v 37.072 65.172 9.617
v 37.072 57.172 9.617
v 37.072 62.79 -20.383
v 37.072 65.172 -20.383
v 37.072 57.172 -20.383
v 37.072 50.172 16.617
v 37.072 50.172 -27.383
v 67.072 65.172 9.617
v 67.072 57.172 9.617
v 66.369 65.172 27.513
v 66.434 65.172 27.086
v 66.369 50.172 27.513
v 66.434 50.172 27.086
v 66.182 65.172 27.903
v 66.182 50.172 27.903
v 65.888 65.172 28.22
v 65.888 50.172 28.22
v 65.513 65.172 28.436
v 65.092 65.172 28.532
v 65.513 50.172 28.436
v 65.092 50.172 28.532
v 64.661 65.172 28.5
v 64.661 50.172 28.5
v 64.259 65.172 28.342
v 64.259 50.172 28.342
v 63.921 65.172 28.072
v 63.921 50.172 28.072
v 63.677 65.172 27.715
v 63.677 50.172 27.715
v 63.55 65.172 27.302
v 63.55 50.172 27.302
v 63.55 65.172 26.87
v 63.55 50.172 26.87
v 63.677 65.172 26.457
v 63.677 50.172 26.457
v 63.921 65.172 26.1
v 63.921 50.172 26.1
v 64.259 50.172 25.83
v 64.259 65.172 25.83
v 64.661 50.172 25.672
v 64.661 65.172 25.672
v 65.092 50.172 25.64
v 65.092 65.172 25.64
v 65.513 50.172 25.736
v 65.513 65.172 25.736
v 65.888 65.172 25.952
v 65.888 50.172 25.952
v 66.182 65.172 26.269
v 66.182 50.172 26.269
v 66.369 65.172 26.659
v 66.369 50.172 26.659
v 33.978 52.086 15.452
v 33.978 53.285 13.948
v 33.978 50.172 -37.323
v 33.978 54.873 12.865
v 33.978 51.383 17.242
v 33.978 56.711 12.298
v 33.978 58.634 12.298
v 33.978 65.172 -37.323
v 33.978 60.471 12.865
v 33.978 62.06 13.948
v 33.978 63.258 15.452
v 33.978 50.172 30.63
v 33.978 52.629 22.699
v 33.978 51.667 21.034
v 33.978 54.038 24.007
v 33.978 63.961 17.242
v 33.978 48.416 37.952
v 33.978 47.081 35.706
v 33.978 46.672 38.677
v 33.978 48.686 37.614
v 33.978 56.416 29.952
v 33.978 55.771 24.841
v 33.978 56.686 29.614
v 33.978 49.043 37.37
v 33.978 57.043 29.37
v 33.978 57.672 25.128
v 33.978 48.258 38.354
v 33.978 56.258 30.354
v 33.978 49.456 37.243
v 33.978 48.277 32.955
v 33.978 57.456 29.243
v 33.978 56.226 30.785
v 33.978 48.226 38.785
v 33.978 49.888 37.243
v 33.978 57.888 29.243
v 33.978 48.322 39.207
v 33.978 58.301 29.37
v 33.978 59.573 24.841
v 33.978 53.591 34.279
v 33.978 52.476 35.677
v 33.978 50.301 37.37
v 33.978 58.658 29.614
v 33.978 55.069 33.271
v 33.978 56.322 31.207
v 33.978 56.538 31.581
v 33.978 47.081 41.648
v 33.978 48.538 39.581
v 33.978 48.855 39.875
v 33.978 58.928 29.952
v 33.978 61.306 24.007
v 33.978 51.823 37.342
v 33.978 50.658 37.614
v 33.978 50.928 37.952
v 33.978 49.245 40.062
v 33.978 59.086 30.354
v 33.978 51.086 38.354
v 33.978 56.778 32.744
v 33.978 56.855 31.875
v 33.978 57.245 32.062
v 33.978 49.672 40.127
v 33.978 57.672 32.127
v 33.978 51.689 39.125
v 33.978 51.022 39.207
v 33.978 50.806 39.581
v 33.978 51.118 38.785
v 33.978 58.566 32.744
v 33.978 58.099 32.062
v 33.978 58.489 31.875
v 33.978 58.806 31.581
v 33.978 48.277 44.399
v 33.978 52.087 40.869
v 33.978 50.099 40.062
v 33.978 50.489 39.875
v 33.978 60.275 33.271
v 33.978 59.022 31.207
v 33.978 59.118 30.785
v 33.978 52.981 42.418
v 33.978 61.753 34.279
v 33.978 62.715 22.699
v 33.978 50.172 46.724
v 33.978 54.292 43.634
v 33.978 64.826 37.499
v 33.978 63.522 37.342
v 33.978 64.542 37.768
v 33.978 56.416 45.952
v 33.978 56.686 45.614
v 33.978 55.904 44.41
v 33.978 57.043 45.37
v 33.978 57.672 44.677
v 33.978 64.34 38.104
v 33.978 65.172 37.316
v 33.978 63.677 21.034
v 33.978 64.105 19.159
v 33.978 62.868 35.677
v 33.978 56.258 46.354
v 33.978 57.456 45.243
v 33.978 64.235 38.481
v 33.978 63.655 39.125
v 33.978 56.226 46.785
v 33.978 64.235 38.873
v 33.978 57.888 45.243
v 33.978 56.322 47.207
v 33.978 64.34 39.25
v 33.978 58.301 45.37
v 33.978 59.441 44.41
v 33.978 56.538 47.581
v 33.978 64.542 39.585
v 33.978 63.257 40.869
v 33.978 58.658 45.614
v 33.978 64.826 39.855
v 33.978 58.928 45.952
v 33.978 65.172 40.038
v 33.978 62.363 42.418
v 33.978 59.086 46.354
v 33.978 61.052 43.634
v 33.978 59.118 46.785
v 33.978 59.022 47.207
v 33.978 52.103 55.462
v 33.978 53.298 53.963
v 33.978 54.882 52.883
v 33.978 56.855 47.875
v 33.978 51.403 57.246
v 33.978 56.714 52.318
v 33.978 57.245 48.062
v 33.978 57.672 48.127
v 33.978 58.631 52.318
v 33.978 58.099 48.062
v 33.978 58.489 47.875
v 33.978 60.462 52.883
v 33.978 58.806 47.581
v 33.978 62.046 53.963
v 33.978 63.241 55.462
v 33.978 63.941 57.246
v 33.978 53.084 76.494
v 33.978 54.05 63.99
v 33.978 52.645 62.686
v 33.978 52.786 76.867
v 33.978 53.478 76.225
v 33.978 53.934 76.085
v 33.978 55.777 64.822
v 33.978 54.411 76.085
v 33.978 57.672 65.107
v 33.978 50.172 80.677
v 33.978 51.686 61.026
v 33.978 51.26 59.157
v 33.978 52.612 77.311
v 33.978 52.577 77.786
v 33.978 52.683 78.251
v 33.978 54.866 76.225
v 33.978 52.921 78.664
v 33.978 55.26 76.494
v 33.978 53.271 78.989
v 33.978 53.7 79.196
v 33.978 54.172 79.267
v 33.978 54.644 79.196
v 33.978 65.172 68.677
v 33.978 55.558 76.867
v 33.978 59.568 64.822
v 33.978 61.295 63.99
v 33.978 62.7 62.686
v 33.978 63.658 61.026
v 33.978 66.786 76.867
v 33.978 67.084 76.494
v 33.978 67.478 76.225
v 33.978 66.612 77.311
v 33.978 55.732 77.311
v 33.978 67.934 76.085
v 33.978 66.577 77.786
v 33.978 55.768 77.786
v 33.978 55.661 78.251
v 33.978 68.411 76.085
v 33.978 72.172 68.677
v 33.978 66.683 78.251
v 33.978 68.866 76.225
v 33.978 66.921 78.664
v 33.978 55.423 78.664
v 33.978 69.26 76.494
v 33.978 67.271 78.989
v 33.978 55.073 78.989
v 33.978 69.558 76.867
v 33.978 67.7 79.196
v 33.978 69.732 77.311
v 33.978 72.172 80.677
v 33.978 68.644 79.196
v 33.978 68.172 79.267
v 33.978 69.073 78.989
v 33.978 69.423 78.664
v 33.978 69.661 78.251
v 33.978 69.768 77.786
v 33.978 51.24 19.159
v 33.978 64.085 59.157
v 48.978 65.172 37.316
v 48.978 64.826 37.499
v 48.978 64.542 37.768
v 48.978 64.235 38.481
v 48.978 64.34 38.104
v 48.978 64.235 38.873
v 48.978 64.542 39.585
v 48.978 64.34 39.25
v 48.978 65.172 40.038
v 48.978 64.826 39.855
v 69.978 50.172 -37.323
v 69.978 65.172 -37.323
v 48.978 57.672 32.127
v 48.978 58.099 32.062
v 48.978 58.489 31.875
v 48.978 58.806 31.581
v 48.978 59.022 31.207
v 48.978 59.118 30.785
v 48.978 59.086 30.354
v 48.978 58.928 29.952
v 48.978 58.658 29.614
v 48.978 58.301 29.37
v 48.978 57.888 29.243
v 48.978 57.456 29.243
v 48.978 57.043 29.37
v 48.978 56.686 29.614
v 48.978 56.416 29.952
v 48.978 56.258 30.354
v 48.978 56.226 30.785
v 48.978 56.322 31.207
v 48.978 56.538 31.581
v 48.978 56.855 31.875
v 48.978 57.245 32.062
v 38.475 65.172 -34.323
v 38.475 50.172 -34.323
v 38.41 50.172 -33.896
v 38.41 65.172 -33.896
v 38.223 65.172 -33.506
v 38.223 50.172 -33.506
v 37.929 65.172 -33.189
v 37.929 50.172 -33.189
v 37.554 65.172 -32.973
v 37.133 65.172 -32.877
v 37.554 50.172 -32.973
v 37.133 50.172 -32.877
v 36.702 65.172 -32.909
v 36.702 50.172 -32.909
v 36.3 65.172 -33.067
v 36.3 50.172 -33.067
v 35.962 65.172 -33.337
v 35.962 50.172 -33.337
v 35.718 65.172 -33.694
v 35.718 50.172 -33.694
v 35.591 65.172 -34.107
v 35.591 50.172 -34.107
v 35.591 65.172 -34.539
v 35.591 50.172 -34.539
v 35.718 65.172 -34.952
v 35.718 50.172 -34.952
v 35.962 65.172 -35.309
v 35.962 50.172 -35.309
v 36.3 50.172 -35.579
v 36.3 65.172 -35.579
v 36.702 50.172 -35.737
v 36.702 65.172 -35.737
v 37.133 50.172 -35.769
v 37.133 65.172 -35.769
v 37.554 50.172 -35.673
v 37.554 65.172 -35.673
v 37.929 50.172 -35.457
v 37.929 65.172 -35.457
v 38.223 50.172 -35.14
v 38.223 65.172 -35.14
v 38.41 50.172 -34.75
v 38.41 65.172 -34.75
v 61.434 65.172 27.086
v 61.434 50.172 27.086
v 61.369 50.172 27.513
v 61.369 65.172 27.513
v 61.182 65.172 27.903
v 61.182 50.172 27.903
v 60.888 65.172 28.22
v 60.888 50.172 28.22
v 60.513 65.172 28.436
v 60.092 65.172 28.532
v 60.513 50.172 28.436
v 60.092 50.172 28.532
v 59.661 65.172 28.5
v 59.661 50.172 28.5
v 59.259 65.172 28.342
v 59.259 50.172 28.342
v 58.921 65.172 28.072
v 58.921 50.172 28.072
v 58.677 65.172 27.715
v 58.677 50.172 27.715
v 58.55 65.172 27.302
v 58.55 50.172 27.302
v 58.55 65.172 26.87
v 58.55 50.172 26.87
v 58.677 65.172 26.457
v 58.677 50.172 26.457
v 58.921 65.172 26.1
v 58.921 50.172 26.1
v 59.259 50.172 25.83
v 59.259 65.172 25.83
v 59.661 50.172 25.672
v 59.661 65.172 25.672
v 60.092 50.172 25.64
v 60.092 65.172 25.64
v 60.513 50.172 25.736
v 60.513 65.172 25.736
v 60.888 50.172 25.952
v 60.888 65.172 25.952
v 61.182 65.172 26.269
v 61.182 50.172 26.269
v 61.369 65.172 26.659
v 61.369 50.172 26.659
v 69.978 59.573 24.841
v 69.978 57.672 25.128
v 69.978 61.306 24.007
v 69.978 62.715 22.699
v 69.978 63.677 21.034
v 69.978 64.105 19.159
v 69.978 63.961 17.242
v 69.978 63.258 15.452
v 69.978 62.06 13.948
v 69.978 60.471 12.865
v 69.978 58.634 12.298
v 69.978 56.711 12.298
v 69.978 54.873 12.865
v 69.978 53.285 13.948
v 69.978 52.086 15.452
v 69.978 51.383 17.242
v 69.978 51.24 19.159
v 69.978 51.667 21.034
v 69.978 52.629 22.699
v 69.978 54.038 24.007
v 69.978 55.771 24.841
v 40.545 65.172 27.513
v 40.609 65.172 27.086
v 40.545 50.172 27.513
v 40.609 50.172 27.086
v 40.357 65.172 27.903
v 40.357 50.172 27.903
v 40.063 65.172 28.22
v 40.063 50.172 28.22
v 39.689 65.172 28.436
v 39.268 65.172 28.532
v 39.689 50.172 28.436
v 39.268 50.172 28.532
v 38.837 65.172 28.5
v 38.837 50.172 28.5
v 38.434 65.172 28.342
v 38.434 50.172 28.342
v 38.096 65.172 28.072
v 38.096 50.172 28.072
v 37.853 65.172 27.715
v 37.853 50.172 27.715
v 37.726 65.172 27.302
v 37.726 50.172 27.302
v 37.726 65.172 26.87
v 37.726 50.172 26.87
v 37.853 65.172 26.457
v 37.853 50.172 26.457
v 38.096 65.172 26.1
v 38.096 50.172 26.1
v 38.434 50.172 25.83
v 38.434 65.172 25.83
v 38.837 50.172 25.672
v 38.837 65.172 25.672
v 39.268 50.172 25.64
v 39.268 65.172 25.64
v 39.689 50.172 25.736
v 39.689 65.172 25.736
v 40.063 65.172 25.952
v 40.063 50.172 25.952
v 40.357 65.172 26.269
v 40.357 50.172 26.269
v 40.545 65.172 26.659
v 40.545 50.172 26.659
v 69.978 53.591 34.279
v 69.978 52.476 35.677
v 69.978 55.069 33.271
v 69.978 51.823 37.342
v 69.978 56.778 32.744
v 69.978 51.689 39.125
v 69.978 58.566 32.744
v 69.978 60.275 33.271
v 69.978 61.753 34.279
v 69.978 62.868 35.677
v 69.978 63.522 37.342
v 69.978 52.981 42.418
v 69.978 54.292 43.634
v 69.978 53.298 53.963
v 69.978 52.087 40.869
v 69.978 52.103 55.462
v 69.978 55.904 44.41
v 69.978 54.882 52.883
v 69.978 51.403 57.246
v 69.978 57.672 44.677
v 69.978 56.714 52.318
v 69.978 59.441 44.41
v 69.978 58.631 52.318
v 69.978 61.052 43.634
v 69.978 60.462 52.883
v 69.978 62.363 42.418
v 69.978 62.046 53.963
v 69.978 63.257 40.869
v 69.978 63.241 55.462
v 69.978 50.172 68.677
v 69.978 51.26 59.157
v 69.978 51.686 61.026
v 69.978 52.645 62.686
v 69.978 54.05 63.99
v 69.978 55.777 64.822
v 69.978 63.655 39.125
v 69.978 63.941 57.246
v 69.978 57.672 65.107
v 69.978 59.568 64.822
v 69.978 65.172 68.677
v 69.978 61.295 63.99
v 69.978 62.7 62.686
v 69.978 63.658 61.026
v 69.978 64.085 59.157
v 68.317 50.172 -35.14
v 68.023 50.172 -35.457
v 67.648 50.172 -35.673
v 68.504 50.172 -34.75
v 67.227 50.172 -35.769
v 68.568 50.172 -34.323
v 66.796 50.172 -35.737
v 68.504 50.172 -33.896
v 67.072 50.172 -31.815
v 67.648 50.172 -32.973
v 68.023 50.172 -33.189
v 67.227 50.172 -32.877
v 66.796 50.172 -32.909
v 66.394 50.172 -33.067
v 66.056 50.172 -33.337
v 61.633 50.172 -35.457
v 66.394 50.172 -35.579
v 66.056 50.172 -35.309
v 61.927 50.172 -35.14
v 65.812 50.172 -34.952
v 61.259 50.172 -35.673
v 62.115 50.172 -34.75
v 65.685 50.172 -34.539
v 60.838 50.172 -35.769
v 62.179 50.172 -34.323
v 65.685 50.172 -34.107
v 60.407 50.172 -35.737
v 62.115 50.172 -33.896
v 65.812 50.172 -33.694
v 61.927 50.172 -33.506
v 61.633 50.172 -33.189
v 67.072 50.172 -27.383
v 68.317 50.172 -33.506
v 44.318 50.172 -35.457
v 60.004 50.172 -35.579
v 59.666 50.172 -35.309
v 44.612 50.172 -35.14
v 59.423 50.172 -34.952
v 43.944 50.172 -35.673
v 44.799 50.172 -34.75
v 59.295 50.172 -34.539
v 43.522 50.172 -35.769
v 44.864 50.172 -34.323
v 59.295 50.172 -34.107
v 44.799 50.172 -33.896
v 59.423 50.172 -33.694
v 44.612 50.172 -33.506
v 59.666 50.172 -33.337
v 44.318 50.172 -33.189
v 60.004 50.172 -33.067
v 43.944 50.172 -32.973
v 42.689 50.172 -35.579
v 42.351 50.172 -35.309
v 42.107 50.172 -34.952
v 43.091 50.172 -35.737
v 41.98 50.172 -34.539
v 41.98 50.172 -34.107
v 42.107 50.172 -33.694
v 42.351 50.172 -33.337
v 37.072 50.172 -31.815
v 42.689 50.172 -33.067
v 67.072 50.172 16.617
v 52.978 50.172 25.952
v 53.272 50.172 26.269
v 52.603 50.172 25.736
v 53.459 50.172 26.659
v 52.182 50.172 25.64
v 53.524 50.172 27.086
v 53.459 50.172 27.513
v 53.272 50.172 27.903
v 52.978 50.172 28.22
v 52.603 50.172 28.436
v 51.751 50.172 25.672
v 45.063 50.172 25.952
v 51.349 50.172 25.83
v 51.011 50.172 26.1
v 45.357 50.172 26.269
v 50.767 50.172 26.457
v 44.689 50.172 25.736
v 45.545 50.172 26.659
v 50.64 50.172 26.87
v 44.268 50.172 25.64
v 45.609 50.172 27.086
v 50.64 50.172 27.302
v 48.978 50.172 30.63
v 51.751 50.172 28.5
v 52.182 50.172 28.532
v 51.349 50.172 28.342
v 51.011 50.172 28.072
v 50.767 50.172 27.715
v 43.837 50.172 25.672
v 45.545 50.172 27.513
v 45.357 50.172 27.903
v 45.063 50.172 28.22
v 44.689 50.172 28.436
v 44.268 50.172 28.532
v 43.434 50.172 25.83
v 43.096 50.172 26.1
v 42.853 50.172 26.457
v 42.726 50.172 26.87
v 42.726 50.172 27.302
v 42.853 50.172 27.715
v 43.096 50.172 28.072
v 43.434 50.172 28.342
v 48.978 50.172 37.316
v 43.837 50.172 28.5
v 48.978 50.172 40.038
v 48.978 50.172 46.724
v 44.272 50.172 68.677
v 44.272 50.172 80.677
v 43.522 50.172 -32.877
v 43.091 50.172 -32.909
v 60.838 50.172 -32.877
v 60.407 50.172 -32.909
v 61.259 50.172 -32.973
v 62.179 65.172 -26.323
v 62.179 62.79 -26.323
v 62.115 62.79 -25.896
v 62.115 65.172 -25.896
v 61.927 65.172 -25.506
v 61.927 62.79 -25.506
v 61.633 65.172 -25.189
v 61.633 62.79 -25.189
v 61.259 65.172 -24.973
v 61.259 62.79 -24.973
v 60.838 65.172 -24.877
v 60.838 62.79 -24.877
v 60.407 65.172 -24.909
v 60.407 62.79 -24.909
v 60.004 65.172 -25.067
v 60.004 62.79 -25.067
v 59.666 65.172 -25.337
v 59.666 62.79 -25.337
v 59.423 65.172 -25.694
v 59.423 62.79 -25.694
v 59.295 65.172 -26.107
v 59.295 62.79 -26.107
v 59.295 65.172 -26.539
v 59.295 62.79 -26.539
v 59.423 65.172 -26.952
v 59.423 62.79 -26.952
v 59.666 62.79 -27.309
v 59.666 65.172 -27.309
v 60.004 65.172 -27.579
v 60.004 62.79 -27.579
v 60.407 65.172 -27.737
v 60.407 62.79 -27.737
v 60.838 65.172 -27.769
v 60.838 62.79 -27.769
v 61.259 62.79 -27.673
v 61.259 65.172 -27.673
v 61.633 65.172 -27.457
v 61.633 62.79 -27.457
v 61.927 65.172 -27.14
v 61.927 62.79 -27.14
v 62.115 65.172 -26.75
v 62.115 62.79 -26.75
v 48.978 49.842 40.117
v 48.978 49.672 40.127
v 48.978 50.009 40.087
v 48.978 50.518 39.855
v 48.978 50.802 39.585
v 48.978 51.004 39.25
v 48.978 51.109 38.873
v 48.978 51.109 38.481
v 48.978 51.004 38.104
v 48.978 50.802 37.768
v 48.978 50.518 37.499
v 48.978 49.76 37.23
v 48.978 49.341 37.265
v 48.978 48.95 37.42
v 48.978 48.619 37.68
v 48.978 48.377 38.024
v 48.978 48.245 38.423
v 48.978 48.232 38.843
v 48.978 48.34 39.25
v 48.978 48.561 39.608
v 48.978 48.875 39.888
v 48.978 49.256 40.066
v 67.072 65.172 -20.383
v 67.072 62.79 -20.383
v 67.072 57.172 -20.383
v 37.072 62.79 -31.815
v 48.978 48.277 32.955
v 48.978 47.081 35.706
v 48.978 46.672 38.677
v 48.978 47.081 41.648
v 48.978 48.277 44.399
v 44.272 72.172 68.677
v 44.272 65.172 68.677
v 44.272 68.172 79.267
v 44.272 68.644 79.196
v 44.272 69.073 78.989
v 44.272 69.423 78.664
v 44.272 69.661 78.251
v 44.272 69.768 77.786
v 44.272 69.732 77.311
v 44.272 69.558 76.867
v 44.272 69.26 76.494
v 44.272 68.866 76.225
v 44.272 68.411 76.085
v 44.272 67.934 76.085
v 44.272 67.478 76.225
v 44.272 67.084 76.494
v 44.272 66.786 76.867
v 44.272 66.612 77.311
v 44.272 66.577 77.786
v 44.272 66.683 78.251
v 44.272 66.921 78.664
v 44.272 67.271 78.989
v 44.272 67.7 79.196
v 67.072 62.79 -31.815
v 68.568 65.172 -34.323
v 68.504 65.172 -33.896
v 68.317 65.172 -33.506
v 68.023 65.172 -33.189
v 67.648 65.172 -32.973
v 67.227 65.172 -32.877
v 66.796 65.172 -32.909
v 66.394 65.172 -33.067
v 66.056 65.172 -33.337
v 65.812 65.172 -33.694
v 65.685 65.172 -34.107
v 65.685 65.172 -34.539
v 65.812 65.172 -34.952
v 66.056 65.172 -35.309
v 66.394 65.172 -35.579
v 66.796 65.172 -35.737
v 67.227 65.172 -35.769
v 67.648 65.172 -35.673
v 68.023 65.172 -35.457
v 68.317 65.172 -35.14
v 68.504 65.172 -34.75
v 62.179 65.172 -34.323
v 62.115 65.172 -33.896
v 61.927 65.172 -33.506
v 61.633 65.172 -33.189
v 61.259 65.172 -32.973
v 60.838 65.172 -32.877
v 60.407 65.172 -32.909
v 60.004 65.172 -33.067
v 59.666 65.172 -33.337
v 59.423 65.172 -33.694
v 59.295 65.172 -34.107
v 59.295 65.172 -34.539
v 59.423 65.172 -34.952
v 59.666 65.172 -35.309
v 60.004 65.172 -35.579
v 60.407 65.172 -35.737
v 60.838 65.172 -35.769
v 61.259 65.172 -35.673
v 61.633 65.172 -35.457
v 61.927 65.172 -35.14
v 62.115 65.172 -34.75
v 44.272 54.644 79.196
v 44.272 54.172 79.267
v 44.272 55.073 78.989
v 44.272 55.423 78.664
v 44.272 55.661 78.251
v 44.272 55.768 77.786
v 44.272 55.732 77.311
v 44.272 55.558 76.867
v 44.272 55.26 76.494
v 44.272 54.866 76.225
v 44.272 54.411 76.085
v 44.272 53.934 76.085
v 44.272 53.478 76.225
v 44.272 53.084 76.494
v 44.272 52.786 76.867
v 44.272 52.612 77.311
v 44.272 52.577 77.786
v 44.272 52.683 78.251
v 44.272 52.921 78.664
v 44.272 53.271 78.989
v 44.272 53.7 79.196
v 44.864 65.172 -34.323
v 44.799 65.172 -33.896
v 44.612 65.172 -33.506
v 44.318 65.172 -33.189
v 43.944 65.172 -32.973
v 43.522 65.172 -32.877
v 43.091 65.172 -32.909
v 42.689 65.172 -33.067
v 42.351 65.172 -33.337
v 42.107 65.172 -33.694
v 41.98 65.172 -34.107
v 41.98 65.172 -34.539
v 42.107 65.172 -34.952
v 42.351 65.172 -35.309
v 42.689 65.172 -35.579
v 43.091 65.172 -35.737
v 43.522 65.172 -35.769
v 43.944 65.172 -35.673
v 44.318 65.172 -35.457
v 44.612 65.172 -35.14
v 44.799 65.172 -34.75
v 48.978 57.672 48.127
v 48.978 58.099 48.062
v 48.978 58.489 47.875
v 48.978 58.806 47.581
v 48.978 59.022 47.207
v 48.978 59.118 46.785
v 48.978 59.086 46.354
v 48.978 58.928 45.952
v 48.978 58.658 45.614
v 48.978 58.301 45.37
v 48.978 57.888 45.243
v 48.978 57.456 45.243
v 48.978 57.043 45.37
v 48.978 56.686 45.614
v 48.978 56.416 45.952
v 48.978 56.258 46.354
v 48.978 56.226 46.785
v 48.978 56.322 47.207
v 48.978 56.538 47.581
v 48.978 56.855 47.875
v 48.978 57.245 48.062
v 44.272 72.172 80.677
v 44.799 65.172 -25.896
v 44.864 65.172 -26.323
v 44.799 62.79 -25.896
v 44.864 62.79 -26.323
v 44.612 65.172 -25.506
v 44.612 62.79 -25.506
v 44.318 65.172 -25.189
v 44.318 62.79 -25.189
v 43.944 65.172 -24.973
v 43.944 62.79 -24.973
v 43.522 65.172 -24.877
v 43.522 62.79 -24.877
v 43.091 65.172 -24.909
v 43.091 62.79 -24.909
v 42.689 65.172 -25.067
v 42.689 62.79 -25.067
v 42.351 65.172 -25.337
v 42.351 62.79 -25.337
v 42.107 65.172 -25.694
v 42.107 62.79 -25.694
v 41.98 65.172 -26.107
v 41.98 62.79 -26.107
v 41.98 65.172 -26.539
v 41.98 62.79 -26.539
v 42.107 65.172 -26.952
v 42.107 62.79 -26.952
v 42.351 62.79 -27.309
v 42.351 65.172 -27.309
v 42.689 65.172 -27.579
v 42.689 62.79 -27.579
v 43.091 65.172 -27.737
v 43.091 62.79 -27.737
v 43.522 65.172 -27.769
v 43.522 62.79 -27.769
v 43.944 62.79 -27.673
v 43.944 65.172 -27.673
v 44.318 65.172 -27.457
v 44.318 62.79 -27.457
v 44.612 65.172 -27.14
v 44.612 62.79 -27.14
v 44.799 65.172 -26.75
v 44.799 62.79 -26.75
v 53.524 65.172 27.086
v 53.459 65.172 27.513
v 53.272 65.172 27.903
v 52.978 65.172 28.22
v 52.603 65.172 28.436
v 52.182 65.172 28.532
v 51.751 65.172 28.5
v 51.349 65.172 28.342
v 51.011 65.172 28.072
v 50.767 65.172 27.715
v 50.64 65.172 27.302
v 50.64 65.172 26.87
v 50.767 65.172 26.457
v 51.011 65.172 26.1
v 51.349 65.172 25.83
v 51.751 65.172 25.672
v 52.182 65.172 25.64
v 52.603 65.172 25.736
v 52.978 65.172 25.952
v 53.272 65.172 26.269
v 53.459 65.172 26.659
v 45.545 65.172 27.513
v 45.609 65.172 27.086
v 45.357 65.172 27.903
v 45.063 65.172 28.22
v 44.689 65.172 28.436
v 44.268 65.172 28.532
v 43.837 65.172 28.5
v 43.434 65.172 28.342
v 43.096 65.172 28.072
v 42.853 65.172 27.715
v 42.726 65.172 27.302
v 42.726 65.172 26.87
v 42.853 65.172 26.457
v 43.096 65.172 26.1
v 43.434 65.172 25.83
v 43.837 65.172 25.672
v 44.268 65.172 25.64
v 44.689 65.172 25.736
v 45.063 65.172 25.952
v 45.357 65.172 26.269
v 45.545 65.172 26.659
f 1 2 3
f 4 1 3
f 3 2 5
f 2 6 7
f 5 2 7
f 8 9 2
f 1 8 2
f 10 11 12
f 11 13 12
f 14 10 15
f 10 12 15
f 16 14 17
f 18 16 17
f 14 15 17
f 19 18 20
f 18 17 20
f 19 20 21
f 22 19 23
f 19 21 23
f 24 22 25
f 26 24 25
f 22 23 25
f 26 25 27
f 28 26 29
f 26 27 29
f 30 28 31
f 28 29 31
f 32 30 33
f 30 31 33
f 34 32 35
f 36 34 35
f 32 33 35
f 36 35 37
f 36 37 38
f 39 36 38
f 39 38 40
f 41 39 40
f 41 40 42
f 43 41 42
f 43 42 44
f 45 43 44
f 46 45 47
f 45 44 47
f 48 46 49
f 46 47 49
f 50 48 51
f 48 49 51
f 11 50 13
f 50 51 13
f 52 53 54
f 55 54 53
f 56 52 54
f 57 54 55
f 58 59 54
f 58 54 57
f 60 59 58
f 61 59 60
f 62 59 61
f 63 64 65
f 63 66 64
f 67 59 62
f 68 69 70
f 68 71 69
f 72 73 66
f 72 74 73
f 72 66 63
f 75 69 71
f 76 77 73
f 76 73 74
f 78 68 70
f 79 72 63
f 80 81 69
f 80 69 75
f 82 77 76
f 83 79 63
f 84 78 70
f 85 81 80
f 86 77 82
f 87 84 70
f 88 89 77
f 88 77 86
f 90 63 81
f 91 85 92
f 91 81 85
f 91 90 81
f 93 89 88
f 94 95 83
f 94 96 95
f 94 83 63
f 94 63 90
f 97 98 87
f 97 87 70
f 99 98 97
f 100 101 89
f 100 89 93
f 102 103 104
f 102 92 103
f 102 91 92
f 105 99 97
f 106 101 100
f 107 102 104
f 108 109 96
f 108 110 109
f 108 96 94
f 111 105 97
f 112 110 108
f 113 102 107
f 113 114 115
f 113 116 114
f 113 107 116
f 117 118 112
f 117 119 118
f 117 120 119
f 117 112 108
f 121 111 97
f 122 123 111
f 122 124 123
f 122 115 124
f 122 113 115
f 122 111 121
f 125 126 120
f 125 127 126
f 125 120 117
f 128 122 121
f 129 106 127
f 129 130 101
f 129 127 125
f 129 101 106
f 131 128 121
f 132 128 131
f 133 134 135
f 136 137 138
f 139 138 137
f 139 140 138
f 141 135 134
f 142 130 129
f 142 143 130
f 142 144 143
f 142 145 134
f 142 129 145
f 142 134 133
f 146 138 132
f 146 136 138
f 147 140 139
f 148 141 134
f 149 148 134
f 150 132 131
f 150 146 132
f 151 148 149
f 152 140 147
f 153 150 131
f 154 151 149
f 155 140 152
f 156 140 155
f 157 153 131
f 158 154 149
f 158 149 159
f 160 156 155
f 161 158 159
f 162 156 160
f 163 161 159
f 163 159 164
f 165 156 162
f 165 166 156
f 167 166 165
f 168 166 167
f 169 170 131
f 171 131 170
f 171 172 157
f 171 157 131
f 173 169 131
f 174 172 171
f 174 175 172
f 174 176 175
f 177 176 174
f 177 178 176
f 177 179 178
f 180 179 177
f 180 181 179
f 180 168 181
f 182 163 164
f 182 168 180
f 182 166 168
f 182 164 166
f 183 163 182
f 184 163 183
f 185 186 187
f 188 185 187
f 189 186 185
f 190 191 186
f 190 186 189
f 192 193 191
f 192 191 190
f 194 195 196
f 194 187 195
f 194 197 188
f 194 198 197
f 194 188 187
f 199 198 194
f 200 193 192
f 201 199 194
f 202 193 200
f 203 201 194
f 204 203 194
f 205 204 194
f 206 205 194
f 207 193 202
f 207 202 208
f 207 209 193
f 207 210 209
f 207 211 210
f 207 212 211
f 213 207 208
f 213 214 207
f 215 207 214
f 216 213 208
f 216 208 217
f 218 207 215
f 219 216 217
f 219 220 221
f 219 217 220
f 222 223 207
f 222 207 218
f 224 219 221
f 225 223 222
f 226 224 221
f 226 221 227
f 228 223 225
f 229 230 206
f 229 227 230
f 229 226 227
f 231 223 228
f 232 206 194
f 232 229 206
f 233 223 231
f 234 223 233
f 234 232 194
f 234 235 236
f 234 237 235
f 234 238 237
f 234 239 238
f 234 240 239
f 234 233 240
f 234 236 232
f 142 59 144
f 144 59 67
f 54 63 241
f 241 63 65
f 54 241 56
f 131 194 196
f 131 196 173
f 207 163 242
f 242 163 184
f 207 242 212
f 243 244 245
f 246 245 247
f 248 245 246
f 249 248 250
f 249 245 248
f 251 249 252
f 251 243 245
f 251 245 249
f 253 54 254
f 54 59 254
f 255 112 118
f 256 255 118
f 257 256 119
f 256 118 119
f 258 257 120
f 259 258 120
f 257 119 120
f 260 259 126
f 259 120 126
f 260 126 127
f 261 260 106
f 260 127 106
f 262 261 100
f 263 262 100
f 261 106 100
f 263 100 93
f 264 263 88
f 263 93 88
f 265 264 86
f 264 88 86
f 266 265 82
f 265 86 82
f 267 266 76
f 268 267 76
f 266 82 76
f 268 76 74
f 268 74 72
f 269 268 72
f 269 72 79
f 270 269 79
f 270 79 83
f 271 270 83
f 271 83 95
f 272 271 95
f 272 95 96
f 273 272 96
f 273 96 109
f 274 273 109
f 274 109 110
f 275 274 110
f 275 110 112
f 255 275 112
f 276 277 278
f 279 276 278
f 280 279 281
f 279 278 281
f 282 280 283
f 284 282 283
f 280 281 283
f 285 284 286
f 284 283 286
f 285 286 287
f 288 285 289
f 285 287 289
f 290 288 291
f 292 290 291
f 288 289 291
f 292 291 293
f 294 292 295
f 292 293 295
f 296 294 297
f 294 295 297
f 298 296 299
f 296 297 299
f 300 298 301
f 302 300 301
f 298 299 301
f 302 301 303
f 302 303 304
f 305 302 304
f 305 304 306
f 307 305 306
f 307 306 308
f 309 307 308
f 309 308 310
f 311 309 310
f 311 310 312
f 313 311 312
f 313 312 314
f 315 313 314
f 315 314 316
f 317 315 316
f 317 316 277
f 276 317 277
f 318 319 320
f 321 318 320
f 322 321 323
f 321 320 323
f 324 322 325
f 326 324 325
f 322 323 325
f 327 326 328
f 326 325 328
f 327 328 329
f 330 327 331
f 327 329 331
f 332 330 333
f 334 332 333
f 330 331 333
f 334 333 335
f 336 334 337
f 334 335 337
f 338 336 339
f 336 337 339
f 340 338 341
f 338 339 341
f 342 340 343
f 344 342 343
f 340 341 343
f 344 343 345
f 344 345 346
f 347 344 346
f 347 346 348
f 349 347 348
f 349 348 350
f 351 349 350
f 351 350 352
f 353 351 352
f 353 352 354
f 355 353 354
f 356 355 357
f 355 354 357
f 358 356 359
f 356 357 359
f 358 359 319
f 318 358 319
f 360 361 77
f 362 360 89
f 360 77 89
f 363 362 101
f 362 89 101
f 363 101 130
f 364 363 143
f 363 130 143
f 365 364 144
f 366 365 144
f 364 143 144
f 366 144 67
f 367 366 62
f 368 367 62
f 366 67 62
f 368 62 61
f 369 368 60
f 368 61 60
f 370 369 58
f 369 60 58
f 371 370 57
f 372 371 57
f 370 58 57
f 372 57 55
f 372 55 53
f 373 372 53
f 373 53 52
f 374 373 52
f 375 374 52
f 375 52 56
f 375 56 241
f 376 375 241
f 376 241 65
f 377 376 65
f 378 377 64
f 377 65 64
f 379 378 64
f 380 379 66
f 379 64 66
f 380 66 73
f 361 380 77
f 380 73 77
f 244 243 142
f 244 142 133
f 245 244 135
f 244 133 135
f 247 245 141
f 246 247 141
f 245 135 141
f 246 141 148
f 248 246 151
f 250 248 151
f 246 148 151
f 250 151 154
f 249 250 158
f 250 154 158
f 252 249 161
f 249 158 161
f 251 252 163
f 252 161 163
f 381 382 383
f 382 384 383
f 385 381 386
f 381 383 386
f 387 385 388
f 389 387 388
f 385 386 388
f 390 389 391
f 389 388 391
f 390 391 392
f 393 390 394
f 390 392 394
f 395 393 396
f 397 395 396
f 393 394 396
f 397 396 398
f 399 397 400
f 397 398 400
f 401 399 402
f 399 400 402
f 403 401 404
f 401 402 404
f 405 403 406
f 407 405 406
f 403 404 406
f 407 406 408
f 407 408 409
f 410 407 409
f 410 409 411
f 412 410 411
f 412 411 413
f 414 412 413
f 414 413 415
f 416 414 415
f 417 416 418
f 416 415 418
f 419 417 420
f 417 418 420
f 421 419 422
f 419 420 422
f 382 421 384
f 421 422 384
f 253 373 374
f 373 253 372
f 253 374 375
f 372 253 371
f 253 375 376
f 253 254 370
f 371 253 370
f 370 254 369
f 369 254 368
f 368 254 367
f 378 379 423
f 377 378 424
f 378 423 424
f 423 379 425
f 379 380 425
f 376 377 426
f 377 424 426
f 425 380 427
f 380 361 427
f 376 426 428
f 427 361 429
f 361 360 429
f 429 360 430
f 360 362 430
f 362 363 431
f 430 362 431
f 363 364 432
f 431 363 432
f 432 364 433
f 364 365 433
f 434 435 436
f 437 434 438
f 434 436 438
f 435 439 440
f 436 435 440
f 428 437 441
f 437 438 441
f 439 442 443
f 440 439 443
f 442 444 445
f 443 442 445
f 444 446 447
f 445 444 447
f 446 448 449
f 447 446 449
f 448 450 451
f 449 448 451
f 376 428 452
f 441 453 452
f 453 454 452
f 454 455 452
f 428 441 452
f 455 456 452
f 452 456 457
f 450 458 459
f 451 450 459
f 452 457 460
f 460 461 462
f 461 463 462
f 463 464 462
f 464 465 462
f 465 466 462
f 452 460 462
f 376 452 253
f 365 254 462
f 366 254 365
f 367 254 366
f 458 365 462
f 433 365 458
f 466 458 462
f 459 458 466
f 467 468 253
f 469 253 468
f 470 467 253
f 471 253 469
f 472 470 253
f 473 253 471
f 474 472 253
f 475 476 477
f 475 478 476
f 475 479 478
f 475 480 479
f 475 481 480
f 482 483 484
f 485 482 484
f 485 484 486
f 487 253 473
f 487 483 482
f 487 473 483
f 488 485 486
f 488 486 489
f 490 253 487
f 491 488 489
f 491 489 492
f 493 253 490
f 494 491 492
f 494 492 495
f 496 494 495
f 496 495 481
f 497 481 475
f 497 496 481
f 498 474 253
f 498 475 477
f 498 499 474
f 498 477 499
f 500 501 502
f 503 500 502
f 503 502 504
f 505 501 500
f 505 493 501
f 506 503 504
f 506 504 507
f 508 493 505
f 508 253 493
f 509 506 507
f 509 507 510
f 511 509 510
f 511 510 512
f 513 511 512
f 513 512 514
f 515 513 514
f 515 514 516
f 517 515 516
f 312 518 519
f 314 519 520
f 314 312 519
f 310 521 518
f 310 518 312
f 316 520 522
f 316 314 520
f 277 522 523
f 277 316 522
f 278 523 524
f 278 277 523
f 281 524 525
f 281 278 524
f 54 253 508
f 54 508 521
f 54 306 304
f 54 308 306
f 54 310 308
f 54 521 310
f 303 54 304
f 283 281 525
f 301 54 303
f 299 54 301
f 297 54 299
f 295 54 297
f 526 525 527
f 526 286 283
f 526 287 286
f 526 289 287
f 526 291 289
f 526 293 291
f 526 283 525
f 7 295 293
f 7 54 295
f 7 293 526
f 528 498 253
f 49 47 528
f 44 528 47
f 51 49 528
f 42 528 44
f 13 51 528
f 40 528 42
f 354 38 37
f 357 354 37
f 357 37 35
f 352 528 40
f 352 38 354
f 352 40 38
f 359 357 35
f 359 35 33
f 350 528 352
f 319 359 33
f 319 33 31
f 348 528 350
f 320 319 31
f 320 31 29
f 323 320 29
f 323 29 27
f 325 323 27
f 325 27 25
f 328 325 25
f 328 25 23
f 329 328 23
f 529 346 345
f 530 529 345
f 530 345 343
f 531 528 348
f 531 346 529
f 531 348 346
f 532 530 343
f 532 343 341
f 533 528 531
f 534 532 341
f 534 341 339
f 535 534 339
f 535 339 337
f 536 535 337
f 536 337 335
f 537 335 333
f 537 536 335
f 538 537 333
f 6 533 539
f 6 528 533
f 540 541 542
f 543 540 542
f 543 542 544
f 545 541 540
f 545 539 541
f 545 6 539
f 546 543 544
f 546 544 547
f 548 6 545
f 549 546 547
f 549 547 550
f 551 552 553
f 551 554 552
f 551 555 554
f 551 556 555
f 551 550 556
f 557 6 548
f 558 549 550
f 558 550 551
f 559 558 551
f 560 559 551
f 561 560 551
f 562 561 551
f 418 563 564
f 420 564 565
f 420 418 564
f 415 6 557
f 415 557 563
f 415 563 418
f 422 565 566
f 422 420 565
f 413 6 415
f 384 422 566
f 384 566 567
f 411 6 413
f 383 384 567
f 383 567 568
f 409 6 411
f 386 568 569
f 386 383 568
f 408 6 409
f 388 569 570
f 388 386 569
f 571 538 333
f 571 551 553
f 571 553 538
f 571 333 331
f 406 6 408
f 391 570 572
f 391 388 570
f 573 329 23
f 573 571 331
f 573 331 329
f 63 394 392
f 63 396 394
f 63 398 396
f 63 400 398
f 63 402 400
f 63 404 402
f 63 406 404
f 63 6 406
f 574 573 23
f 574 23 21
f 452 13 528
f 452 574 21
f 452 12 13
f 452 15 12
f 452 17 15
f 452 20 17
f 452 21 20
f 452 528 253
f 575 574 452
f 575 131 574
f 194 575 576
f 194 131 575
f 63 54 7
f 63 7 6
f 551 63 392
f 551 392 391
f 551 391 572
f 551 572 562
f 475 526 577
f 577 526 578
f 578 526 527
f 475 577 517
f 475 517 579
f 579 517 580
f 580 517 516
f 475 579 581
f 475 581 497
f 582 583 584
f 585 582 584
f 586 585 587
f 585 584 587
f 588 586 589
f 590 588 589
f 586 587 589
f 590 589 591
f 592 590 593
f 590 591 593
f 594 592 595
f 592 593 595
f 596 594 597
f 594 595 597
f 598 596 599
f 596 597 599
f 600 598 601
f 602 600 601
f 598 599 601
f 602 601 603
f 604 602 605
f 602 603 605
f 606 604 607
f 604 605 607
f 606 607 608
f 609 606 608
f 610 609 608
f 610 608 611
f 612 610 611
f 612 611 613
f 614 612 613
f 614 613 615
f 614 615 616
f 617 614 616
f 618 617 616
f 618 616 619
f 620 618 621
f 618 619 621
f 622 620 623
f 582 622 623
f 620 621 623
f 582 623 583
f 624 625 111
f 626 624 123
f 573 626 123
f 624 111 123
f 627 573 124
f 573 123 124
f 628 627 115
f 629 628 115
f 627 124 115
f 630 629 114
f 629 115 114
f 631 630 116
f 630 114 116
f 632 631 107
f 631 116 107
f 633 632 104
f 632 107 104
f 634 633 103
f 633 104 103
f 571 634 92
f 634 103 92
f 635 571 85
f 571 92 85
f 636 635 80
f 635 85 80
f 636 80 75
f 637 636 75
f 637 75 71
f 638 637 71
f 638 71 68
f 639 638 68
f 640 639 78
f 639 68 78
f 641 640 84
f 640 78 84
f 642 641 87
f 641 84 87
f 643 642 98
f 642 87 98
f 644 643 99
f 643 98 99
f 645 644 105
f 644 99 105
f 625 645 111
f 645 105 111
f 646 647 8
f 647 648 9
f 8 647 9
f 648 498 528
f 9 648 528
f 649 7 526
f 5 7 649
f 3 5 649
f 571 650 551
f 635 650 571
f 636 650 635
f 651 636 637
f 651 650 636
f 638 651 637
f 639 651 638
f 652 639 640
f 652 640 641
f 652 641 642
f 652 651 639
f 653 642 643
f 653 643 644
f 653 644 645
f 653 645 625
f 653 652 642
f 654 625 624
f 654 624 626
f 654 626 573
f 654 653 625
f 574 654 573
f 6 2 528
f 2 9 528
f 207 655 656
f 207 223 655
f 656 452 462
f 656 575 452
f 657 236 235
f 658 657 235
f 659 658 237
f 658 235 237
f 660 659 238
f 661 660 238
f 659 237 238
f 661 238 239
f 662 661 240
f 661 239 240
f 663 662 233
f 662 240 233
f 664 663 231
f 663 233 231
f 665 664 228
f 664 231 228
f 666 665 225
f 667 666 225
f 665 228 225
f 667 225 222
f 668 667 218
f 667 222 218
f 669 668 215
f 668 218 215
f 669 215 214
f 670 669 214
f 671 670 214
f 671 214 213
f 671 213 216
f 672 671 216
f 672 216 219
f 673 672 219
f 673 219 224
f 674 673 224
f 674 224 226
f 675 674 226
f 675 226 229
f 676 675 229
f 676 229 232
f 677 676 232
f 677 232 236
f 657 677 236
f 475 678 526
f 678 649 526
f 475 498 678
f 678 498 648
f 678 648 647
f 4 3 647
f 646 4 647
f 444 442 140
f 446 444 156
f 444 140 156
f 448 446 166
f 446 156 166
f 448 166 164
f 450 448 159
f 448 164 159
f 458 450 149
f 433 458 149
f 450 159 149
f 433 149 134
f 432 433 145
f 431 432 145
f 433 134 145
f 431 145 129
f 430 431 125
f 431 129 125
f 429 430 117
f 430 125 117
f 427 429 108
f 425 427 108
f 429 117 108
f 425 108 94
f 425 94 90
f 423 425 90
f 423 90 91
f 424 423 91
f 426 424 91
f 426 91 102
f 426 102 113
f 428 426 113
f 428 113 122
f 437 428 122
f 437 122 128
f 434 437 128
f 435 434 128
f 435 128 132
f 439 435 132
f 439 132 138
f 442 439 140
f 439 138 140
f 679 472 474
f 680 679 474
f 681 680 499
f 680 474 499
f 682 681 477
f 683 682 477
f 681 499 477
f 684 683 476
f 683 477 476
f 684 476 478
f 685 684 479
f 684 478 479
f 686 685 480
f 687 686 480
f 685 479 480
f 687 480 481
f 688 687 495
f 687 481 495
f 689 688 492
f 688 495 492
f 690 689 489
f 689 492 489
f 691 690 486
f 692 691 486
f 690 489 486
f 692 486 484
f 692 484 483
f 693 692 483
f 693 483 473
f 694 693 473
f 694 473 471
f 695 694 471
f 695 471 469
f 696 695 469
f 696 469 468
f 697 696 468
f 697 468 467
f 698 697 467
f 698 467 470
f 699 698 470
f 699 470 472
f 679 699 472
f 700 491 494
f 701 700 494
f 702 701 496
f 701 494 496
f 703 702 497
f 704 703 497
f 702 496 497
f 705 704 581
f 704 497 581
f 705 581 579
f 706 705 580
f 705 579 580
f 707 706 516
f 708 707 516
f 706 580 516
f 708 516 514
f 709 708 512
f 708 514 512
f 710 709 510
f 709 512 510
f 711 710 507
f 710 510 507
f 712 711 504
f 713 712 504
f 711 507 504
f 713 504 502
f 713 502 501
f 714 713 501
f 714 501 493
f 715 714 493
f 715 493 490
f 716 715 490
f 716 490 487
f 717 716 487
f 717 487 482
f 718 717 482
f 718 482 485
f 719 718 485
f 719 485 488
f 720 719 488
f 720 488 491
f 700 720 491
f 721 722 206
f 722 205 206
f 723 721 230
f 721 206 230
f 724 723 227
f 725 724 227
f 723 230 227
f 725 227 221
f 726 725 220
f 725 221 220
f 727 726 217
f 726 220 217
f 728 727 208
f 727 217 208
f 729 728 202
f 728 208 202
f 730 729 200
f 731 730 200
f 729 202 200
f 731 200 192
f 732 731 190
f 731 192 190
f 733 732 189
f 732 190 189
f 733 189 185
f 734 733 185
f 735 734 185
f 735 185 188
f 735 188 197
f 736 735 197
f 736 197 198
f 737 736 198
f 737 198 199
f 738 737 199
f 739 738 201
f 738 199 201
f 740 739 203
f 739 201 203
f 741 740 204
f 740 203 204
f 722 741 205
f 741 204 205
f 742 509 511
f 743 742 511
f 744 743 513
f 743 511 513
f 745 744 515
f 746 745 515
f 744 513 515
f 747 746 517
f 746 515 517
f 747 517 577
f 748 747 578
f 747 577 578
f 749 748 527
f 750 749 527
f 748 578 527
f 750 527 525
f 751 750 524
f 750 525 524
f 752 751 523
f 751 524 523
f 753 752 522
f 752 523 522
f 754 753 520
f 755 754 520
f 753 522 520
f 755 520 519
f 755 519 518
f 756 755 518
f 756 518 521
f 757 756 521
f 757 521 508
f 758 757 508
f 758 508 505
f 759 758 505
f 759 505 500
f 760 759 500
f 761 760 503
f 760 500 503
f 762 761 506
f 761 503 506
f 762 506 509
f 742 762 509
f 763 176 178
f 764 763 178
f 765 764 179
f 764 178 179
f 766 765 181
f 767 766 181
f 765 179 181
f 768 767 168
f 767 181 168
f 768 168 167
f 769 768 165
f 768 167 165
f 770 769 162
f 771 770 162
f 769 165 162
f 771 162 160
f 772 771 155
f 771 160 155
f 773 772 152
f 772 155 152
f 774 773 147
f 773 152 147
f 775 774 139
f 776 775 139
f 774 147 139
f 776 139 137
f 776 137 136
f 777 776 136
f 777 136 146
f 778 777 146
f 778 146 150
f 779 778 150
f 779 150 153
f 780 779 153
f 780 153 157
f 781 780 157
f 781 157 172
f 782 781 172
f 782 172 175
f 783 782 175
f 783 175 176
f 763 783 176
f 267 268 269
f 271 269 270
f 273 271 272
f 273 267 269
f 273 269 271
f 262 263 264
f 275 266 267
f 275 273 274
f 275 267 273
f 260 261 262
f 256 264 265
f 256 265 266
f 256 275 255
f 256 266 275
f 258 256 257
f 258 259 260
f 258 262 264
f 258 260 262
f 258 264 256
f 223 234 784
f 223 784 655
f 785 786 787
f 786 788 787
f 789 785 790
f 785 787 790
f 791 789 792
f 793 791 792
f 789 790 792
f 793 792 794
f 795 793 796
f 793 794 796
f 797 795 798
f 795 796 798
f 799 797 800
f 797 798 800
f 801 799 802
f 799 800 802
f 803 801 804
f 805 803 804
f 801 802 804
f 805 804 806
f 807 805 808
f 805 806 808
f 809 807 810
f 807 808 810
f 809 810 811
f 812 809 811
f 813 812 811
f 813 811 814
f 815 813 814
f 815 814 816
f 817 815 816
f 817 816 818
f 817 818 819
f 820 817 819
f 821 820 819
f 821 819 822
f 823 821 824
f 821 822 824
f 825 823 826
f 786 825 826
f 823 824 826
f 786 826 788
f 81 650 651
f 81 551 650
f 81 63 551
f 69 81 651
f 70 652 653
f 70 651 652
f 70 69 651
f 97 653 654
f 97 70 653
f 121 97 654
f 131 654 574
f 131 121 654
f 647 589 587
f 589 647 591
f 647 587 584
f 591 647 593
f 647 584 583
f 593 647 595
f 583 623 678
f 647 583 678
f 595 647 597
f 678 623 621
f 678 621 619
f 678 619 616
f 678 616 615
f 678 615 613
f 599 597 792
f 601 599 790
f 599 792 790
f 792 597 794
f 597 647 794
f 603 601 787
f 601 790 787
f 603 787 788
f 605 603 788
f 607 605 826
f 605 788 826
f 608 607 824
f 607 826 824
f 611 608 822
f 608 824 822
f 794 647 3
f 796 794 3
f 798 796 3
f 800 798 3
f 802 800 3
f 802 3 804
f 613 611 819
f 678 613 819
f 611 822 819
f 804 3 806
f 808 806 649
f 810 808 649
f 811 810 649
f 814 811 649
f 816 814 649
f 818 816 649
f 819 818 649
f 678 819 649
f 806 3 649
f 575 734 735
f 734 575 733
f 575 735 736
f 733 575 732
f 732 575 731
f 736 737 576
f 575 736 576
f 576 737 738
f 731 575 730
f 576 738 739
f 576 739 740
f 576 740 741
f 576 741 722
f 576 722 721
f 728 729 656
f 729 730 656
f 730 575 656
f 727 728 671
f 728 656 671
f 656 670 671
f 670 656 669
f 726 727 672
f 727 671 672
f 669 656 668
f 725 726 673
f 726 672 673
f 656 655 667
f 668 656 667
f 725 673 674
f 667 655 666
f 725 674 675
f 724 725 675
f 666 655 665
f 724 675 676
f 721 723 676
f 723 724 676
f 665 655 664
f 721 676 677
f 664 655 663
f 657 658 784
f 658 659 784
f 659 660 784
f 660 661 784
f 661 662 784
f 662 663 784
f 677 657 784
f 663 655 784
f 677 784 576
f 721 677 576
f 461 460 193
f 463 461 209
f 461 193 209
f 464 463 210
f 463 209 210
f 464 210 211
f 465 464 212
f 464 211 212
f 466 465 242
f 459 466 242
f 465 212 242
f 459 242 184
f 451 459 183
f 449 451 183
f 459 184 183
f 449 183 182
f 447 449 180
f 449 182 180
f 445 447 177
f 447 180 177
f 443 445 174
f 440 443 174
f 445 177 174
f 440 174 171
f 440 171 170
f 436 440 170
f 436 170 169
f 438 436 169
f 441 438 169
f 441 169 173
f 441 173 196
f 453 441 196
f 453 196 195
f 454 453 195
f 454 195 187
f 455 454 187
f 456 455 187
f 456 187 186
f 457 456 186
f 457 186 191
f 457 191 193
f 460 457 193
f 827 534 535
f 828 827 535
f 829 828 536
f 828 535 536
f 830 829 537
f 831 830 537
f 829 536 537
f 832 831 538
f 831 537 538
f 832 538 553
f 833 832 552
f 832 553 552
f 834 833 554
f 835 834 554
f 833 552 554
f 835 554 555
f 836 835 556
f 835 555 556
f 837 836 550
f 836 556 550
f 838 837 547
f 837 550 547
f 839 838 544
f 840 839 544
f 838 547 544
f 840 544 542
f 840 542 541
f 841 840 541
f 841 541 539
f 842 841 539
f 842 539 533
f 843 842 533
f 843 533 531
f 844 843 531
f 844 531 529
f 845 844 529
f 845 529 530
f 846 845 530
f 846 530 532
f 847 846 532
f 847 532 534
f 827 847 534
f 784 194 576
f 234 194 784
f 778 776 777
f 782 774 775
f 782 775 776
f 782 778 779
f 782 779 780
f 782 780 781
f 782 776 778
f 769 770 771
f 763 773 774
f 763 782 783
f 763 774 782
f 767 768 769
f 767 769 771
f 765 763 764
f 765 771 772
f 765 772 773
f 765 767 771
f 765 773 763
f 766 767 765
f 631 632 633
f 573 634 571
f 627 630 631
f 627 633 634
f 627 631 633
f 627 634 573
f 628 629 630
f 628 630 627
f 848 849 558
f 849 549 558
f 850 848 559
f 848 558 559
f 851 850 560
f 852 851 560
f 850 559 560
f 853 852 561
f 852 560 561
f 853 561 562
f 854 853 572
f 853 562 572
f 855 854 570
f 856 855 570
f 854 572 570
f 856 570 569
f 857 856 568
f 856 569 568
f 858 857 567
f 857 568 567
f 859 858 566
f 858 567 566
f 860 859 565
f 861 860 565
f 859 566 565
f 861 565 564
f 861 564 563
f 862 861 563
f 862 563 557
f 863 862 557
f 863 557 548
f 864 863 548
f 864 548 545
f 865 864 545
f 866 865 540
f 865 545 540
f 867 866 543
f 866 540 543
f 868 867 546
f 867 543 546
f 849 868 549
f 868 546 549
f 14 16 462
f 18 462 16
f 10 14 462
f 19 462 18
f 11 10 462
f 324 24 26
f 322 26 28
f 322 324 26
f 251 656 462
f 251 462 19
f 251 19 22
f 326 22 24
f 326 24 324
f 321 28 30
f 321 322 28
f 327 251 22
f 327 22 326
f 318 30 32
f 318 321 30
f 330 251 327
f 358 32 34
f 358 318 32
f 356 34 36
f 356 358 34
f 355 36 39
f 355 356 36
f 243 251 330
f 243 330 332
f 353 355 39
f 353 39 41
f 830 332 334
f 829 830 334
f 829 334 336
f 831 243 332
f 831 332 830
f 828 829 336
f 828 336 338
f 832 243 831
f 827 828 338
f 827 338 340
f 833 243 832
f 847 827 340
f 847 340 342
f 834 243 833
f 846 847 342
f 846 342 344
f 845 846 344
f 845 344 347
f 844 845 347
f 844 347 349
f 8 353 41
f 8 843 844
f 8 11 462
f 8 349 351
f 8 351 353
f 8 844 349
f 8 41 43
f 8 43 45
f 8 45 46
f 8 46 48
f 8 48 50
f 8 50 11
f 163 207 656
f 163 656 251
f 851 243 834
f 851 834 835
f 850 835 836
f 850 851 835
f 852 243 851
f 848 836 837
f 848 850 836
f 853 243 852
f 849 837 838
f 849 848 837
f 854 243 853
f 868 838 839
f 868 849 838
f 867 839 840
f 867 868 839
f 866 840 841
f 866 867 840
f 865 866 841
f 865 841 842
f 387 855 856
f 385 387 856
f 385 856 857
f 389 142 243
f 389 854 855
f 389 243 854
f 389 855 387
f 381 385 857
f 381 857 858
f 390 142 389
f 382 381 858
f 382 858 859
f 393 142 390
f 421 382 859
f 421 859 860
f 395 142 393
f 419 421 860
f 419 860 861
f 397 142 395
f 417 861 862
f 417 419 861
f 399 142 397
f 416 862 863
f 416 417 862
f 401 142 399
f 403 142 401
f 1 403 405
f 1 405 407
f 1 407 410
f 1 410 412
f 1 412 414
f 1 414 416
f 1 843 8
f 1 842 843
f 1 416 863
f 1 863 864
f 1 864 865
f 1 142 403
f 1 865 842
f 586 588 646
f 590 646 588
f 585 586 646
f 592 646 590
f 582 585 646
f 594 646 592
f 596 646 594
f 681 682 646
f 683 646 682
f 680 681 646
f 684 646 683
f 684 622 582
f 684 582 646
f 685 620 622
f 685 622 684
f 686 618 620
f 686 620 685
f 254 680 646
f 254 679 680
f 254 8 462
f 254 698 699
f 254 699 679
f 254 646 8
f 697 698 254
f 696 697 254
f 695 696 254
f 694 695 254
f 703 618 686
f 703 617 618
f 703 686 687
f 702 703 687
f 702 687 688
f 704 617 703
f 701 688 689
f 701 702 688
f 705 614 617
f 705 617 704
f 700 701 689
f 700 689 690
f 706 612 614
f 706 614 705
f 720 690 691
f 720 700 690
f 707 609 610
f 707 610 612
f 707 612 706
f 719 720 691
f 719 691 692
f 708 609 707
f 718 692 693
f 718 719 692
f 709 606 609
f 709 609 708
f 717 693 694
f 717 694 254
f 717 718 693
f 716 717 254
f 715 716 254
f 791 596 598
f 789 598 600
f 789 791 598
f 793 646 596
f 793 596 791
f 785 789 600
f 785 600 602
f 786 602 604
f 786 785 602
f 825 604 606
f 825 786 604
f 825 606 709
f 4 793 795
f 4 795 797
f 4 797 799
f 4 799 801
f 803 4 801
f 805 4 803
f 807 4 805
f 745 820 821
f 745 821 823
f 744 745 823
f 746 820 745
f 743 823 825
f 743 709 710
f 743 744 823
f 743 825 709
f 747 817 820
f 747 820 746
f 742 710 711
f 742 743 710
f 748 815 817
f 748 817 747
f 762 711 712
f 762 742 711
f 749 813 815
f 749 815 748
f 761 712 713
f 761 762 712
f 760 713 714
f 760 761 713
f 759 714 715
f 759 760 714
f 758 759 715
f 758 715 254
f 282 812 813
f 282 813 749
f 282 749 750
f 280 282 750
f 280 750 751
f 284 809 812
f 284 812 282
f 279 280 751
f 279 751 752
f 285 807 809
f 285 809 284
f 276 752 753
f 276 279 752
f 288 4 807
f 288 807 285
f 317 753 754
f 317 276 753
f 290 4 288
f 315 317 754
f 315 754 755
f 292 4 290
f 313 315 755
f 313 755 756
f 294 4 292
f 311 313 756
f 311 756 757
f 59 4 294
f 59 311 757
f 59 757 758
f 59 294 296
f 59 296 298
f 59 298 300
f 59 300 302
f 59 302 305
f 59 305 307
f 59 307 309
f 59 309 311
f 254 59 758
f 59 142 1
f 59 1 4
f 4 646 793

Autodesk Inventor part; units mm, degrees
ref_plane "YZ Plane" through (0, 0, 0) normal (1, 0, 0) x (0, 1, 0)
ref_plane "Work Plane1" through (49.1675, 65.1721, -19.9847) normal (0, 1, 0) x (-1, 0, 0)
sketch "Sketch1" plane through (49.1675, 65.1721, -19.9847) normal (0, 1, 0) x (-1, 0, 0)
  circle A0 centre (-2.8102, 4.1616) radius 0.75 construction
  circle A1 centre (-2.8102, 25.1616) radius 0.75 construction
  line L0 (11.6898, 12.5705) -> (11.6898, 16.7526) construction
  arc A2 (11.6898, 16.7526) -> (11.6898, 12.5705) centre (-2.8102, 14.6616) ccw construction
  arc A3 (6.4943, 19.8433) -> (3.1979, 23.455) centre (-2.8102, 14.6616) ccw construction
  arc A4 (3.1979, 5.8681) -> (6.3691, 9.2612) centre (-2.8102, 14.6616) ccw construction
  line L1 (6.4943, 19.8433) -> (10.0762, 19.8433) construction
  line L2 (10.0762, 19.8433) -> (10.0762, 9.2612) construction
  line L3 (10.0762, 9.2612) -> (6.3691, 9.2612) construction
  arc A5 (-8.8183, 23.455) -> (-8.8183, 5.8681) centre (-2.8102, 14.6616) ccw construction
  line L4 (15.1898, -17.3384) -> (-20.8102, -17.3384)
  line L5 (-20.8102, -17.3384) -> (-20.8102, 14.6616)
  line L6 (-20.8102, 14.6616) -> (15.1898, 14.6616)
  line L7 (15.1898, 14.6616) -> (15.1898, -17.3384)
  arc A6 (4.8861, 27.3616) -> (3.5031, 1.2204) centre (-2.8102, 14.6616) ccw construction
  line L8 (4.8861, 27.3616) -> (11.8898, 27.3616) construction
  line L9 (11.8898, 27.3616) -> (11.8898, 1.9616) construction
  line L10 (11.8898, 1.9616) -> (4.7096, 1.9616) construction
  line L11 (4.7096, 1.9616) -> (2.6908, 5.7766) construction
  arc A7 (2.6908, 5.7766) -> (6.254, 9.4612) centre (-2.8102, 14.6616) ccw construction
  line L12 (6.254, 9.4612) -> (9.8762, 9.4612) construction
  line L13 (9.8762, 9.4612) -> (9.8762, 19.6433) construction
  line L14 (9.8762, 19.6433) -> (6.376, 19.6433) construction
  arc A8 (6.376, 19.6433) -> (3.2687, 23.1616) centre (-2.8102, 14.6616) ccw construction
  line L15 (3.2687, 23.1616) -> (-8.889, 23.1616) construction
  arc A9 (-8.889, 23.1616) -> (-8.446, 5.8616) centre (-2.8102, 14.6616) ccw construction
  line L16 (-8.446, 5.8616) -> (1.0472, 5.8616) construction
  line L17 (1.0472, 5.8616) -> (3.5031, 1.2204) construction
  arc A10 (-17.6602, 14.6616) -> (4.7096, 1.9616) centre (-2.9041, 14.6019) ccw
  line L18 (4.7096, 1.9616) -> (11.8943, 1.9616)
  line L19 (11.8943, 1.9616) -> (11.8898, 14.6616)
  line L20 (11.8898, 14.6616) -> (15.1898, 14.6616)
  line L21 (3.1979, 5.8681) -> (-8.8183, 5.8681) projected
  line L22 (3.1979, 23.455) -> (-8.8183, 23.455) projected
  point P0 (49.1675, 19.9847)
  dimension "d0" = 32
  dimension "d2" = 18
  dimension "d3" = 18
  dimension "d4" = 0.2
extrude "Extrusion1" add sketch "Sketch1" against normal blind 15 contours L4 L5 L6 A10 L18 L19 L7
mirror "Mirror1" about plane through (37.2777, 65.1721, -5.3231) normal (0, 0, 1) of "Extrusion1"
sketch "Sketch4" plane through (33.9777, 50.1721, -37.3231) normal (-1, 0, 0) x (0, 0, 1)
  line L0 (0, 15) -> (64, 15) projected
  line L1 (0, 15) -> (0, 0) projected
  line L2 (0, 0) -> (64, 0) projected
  line L3 (64, 15) -> (64, 0) projected
  line L4 (0, 15) -> (64, 15) projected
  line L5 (64, 15) -> (88, 15)
  line L6 (88, 15) -> (88, 0)
  line L7 (88, 0) -> (64, 0)
  line L8 (64, 0) -> (64, 15)
  circle A0 centre (56, 7.5) radius 3 projected
  circle A1 centre (56, 7.5) radius 5 projected
  circle A2 centre (76, 7.5) radius 6
  point P0 (37.3231, -50.1721)
  dimension "d20" = 24
  dimension "d21" = 12
  dimension "d24" = 12
extrude "Extrusion4" add sketch "Sketch4" against normal up to surface (36 mm away) contours L5 L6 L7 L3
ref_plane "Work Plane4" through (33.9777, 57.6721, 36.6769) normal (1, 0, 0) x (0, 0, 1)
sketch "Sketch6" plane through (33.9777, 57.6721, 36.6769) normal (1, 0, 0) x (0, 0, 1)
  circle A0 centre (10, 0) radius 1.625 construction
  circle A1 centre (2, -8) radius 1.625 projected
  circle A2 centre (-6, 0) radius 1.625 construction
  circle A3 centre (2, 8) radius 1.625 projected
  circle A4 centre (2, 0) radius 4 projected
  circle A5 centre (2, 0) radius 11 construction
  line L0 (14, 7.5) -> (-74, 7.5) projected
  arc A6 (10.0467, 7.5) -> (-6.0467, 7.5) centre (2, 0) ccw
  point P0 (-36.6769, 57.6721)
extrude "Extrusion6" add sketch "Sketch6" along normal blind 15 contours A3 L0 | A3 L0 A6 | L0 A3
sketch "Sketch5" plane through (33.9777, 50.1721, -37.3231) normal (-1, 0, 0) x (0, 0, 1)
  circle A0 centre (68, 7.5) radius 1.625 projected
  circle A1 centre (84, 7.5) radius 1.625 projected
  circle A2 centre (84, 7.5) radius 1.45
  circle A3 centre (68, 7.5) radius 1.45
  circle A4 centre (76, 15.5) radius 1.625 projected
  circle A5 centre (76, -0.5) radius 1.625 projected
  circle A6 centre (76, -0.5) radius 1.45
  circle A7 centre (76, 15.5) radius 1.45
  point P0 (37.3231, -50.1721)
  dimension "d25" = 2.9
  dimension "d26" = 2.9
  dimension "d31" = 2.9
  dimension "d32" = 2.9
extrude "Extrusion5" cut sketch "Sketch5" against normal blind 15 contours A2 | A3 | A6 | A7
sketch "Sketch7" plane through (33.9777, 50.1721, -37.3231) normal (-1, 0, 0) x (0, 0, 1)
  arc A0 (74.6389, 15) -> (77.3611, 15) centre (76, 15.5) ccw projected
  line L0 (0, 15) -> (74.6389, 15) projected
  line L1 (0, 15) -> (0, 0) projected
  line L2 (67.9533, 0) -> (0, 0) projected
  arc A1 (67.9533, 0) -> (84.0467, 0) centre (76, 7.5) ccw projected
  line L3 (88, 0) -> (84.0467, 0) projected
  line L4 (88, 15) -> (88, 0) projected
  line L5 (77.3611, 15) -> (88, 15) projected
  circle A2 centre (68, 7.5) radius 1.45 projected
  circle A3 centre (84, 7.5) radius 1.45 projected
  circle A4 centre (76, -0.5) radius 1.45 projected
  circle A5 centre (76, 7.5) radius 6 projected
  line L6 (0, 0) -> (88, 0) projected
  line L7 (88, 0) -> (106, 0)
  line L8 (106, 0) -> (106, 15)
  line L9 (106, 15) -> (88, 15)
  line L10 (88, 15) -> (88, 0)
  circle A6 centre (96, 7.5) radius 6.4305
  circle A7 centre (56, 7.5) radius 6.4532
  point P0 (37.3231, -50.1721)
  dimension "d34" = 20
  dimension "d35" = 10
  dimension "d40" = 20
extrude "Extrusion7" add sketch "Sketch7" against normal up to surface (36 mm away) contours L9 L8 L7 L4
sketch "Sketch9" plane through (33.9777, 50.1721, -37.3231) normal (-1, 0, 0) x (0, 0, 1)
  circle A0 centre (96, 7.5) radius 6.4305 projected
  circle A1 centre (56, 7.5) radius 6.4506
  point P0 (37.3231, -50.1721)
  dimension "d41" = 40
extrude "Extrusion9" cut sketch "Sketch9" against normal through all contours A1
sketch "Sketch10" plane through (33.9777, 50.1721, 68.6769) normal (0, 0, 1) x (1, 0, 0)
  circle A0 centre (18.104, 4) radius 1.4
  circle A1 centre (18.104, 18) radius 1.4
  point P0 (-33.9777, -50.1721)
sketch "Sketch11" plane through (33.9777, 50.1721, -37.3231) normal (-1, 0, 0) x (0, 0, 1)
  circle A0 centre (114.9899, 4) radius 1.4
  circle A1 centre (114.9899, 18) radius 1.4
  line L0 (106, 15) -> (106, 0) projected
  line L1 (106, 0) -> (118, 0)
  line L2 (118, 0) -> (118, 22)
  line L3 (118, 22) -> (106, 22)
  line L4 (106, 22) -> (106, 0)
  circle A2 centre (114.9899, 4) radius 1.6
  circle A3 centre (114.9899, 18) radius 1.6
  point P0 (37.3231, -50.1721)
  dimension "d44" = 12
  dimension "d45" = 22
  dimension "d46" = 3.2
  dimension "d47" = 3.2
ref_plane "Work Plane5" through (44.2715, 46.1721, 69.8769) normal (-1, 0, 0) x (0, 0, 1)
extrude "Extrusion10" add sketch "Sketch11" against normal up to surface (10.2939 mm away) contours L4 L3 L2 L1 L0
sketch "Sketch12" plane through (49.1675, 50.1721, -19.9847) normal (0, -1, 0) x (1, 0, 0)
  circle A0 centre (-12.1429, -14.3384) radius 1.45
  circle A1 centre (-5.7536, -14.3384) radius 1.45
  circle A2 centre (-5.7536, -6.3384) radius 1.45
  circle A3 centre (11.5617, -14.3384) radius 1.45
  circle A4 centre (11.5617, -6.3384) radius 1.45
  circle A5 centre (17.951, -14.3384) radius 1.45
  circle A6 centre (10.8162, 47.0708) radius 1.45
  circle A7 centre (-5.0081, 47.0708) radius 1.45
  circle A8 centre (-10.0081, 47.0708) radius 1.45
  circle A9 centre (15.8162, 47.0708) radius 1.45
  circle A10 centre (2.9062, 47.0708) radius 1.45
  point P0 (-49.1675, 19.9847)
  dimension "d61" = 2.9
  dimension "d62" = 2.9
  dimension "d63" = 5
  dimension "d64" = 5
  dimension "d65" = 7.91
extrude "Extrusion11" cut sketch "Sketch12" against normal through all
sketch "Sketch13" plane through (49.1675, 50.1721, -19.9847) normal (0, -1, 0) x (1, 0, 0)
  arc A0 (-4.7096, 1.9616) -> (17.6602, 14.6616) centre (2.9041, 14.6019) ccw projected
  line L0 (-12.0959, -0.3981) -> (17.9041, -0.3981)
  line L1 (17.9041, -0.3981) -> (17.9041, 29.6019)
  line L2 (17.9041, 29.6019) -> (-12.0959, 29.6019)
  line L3 (-12.0959, 29.6019) -> (-12.0959, -0.3981)
  line L4 (-12.0959, -0.3981) -> (17.9041, 29.6019) construction
  line L5 (17.9041, -0.3981) -> (-12.0959, 29.6019) construction
  point P0 (-49.1675, 19.9847)
  dimension "d52" = 30
  dimension "d53" = 30
extrude "Extrusion12" cut sketch "Sketch13" against normal through all
chamfer "Chamfer1" distance 7 angle 45 2 edges at (52.0715, 50.1721, 9.6173) (52.0715, 50.1721, -20.3827)
ref_plane "Work Plane6" through (52.0715, 50.1721, -29.4723) normal (1, 0, 0) x (0, 1, 0)
sketch "Sketch14" plane through (52.0715, 50.1721, -29.4723) normal (1, 0, 0) x (0, 1, 0)
  line L0 (-2.0896, 10.3903) -> (12.6182, 10.3903)
  line L1 (12.6182, 10.3903) -> (12.6182, -2.343)
  line L2 (12.6182, -2.343) -> (-2.0896, -2.343)
  line L3 (-2.0896, -2.343) -> (-2.0896, 10.3903)
  point P0 (-50.1721, 29.4723)
ref_plane "Work Plane7" through (57.0715, 40.1721, -25.6076) normal (-1, 0, 0) x (0, 0, 1)
extrude "Extrusion14" cut sketch "Sketch14" along normal mid plane 30
properties part number "01_Slide_camera_x_v0"
